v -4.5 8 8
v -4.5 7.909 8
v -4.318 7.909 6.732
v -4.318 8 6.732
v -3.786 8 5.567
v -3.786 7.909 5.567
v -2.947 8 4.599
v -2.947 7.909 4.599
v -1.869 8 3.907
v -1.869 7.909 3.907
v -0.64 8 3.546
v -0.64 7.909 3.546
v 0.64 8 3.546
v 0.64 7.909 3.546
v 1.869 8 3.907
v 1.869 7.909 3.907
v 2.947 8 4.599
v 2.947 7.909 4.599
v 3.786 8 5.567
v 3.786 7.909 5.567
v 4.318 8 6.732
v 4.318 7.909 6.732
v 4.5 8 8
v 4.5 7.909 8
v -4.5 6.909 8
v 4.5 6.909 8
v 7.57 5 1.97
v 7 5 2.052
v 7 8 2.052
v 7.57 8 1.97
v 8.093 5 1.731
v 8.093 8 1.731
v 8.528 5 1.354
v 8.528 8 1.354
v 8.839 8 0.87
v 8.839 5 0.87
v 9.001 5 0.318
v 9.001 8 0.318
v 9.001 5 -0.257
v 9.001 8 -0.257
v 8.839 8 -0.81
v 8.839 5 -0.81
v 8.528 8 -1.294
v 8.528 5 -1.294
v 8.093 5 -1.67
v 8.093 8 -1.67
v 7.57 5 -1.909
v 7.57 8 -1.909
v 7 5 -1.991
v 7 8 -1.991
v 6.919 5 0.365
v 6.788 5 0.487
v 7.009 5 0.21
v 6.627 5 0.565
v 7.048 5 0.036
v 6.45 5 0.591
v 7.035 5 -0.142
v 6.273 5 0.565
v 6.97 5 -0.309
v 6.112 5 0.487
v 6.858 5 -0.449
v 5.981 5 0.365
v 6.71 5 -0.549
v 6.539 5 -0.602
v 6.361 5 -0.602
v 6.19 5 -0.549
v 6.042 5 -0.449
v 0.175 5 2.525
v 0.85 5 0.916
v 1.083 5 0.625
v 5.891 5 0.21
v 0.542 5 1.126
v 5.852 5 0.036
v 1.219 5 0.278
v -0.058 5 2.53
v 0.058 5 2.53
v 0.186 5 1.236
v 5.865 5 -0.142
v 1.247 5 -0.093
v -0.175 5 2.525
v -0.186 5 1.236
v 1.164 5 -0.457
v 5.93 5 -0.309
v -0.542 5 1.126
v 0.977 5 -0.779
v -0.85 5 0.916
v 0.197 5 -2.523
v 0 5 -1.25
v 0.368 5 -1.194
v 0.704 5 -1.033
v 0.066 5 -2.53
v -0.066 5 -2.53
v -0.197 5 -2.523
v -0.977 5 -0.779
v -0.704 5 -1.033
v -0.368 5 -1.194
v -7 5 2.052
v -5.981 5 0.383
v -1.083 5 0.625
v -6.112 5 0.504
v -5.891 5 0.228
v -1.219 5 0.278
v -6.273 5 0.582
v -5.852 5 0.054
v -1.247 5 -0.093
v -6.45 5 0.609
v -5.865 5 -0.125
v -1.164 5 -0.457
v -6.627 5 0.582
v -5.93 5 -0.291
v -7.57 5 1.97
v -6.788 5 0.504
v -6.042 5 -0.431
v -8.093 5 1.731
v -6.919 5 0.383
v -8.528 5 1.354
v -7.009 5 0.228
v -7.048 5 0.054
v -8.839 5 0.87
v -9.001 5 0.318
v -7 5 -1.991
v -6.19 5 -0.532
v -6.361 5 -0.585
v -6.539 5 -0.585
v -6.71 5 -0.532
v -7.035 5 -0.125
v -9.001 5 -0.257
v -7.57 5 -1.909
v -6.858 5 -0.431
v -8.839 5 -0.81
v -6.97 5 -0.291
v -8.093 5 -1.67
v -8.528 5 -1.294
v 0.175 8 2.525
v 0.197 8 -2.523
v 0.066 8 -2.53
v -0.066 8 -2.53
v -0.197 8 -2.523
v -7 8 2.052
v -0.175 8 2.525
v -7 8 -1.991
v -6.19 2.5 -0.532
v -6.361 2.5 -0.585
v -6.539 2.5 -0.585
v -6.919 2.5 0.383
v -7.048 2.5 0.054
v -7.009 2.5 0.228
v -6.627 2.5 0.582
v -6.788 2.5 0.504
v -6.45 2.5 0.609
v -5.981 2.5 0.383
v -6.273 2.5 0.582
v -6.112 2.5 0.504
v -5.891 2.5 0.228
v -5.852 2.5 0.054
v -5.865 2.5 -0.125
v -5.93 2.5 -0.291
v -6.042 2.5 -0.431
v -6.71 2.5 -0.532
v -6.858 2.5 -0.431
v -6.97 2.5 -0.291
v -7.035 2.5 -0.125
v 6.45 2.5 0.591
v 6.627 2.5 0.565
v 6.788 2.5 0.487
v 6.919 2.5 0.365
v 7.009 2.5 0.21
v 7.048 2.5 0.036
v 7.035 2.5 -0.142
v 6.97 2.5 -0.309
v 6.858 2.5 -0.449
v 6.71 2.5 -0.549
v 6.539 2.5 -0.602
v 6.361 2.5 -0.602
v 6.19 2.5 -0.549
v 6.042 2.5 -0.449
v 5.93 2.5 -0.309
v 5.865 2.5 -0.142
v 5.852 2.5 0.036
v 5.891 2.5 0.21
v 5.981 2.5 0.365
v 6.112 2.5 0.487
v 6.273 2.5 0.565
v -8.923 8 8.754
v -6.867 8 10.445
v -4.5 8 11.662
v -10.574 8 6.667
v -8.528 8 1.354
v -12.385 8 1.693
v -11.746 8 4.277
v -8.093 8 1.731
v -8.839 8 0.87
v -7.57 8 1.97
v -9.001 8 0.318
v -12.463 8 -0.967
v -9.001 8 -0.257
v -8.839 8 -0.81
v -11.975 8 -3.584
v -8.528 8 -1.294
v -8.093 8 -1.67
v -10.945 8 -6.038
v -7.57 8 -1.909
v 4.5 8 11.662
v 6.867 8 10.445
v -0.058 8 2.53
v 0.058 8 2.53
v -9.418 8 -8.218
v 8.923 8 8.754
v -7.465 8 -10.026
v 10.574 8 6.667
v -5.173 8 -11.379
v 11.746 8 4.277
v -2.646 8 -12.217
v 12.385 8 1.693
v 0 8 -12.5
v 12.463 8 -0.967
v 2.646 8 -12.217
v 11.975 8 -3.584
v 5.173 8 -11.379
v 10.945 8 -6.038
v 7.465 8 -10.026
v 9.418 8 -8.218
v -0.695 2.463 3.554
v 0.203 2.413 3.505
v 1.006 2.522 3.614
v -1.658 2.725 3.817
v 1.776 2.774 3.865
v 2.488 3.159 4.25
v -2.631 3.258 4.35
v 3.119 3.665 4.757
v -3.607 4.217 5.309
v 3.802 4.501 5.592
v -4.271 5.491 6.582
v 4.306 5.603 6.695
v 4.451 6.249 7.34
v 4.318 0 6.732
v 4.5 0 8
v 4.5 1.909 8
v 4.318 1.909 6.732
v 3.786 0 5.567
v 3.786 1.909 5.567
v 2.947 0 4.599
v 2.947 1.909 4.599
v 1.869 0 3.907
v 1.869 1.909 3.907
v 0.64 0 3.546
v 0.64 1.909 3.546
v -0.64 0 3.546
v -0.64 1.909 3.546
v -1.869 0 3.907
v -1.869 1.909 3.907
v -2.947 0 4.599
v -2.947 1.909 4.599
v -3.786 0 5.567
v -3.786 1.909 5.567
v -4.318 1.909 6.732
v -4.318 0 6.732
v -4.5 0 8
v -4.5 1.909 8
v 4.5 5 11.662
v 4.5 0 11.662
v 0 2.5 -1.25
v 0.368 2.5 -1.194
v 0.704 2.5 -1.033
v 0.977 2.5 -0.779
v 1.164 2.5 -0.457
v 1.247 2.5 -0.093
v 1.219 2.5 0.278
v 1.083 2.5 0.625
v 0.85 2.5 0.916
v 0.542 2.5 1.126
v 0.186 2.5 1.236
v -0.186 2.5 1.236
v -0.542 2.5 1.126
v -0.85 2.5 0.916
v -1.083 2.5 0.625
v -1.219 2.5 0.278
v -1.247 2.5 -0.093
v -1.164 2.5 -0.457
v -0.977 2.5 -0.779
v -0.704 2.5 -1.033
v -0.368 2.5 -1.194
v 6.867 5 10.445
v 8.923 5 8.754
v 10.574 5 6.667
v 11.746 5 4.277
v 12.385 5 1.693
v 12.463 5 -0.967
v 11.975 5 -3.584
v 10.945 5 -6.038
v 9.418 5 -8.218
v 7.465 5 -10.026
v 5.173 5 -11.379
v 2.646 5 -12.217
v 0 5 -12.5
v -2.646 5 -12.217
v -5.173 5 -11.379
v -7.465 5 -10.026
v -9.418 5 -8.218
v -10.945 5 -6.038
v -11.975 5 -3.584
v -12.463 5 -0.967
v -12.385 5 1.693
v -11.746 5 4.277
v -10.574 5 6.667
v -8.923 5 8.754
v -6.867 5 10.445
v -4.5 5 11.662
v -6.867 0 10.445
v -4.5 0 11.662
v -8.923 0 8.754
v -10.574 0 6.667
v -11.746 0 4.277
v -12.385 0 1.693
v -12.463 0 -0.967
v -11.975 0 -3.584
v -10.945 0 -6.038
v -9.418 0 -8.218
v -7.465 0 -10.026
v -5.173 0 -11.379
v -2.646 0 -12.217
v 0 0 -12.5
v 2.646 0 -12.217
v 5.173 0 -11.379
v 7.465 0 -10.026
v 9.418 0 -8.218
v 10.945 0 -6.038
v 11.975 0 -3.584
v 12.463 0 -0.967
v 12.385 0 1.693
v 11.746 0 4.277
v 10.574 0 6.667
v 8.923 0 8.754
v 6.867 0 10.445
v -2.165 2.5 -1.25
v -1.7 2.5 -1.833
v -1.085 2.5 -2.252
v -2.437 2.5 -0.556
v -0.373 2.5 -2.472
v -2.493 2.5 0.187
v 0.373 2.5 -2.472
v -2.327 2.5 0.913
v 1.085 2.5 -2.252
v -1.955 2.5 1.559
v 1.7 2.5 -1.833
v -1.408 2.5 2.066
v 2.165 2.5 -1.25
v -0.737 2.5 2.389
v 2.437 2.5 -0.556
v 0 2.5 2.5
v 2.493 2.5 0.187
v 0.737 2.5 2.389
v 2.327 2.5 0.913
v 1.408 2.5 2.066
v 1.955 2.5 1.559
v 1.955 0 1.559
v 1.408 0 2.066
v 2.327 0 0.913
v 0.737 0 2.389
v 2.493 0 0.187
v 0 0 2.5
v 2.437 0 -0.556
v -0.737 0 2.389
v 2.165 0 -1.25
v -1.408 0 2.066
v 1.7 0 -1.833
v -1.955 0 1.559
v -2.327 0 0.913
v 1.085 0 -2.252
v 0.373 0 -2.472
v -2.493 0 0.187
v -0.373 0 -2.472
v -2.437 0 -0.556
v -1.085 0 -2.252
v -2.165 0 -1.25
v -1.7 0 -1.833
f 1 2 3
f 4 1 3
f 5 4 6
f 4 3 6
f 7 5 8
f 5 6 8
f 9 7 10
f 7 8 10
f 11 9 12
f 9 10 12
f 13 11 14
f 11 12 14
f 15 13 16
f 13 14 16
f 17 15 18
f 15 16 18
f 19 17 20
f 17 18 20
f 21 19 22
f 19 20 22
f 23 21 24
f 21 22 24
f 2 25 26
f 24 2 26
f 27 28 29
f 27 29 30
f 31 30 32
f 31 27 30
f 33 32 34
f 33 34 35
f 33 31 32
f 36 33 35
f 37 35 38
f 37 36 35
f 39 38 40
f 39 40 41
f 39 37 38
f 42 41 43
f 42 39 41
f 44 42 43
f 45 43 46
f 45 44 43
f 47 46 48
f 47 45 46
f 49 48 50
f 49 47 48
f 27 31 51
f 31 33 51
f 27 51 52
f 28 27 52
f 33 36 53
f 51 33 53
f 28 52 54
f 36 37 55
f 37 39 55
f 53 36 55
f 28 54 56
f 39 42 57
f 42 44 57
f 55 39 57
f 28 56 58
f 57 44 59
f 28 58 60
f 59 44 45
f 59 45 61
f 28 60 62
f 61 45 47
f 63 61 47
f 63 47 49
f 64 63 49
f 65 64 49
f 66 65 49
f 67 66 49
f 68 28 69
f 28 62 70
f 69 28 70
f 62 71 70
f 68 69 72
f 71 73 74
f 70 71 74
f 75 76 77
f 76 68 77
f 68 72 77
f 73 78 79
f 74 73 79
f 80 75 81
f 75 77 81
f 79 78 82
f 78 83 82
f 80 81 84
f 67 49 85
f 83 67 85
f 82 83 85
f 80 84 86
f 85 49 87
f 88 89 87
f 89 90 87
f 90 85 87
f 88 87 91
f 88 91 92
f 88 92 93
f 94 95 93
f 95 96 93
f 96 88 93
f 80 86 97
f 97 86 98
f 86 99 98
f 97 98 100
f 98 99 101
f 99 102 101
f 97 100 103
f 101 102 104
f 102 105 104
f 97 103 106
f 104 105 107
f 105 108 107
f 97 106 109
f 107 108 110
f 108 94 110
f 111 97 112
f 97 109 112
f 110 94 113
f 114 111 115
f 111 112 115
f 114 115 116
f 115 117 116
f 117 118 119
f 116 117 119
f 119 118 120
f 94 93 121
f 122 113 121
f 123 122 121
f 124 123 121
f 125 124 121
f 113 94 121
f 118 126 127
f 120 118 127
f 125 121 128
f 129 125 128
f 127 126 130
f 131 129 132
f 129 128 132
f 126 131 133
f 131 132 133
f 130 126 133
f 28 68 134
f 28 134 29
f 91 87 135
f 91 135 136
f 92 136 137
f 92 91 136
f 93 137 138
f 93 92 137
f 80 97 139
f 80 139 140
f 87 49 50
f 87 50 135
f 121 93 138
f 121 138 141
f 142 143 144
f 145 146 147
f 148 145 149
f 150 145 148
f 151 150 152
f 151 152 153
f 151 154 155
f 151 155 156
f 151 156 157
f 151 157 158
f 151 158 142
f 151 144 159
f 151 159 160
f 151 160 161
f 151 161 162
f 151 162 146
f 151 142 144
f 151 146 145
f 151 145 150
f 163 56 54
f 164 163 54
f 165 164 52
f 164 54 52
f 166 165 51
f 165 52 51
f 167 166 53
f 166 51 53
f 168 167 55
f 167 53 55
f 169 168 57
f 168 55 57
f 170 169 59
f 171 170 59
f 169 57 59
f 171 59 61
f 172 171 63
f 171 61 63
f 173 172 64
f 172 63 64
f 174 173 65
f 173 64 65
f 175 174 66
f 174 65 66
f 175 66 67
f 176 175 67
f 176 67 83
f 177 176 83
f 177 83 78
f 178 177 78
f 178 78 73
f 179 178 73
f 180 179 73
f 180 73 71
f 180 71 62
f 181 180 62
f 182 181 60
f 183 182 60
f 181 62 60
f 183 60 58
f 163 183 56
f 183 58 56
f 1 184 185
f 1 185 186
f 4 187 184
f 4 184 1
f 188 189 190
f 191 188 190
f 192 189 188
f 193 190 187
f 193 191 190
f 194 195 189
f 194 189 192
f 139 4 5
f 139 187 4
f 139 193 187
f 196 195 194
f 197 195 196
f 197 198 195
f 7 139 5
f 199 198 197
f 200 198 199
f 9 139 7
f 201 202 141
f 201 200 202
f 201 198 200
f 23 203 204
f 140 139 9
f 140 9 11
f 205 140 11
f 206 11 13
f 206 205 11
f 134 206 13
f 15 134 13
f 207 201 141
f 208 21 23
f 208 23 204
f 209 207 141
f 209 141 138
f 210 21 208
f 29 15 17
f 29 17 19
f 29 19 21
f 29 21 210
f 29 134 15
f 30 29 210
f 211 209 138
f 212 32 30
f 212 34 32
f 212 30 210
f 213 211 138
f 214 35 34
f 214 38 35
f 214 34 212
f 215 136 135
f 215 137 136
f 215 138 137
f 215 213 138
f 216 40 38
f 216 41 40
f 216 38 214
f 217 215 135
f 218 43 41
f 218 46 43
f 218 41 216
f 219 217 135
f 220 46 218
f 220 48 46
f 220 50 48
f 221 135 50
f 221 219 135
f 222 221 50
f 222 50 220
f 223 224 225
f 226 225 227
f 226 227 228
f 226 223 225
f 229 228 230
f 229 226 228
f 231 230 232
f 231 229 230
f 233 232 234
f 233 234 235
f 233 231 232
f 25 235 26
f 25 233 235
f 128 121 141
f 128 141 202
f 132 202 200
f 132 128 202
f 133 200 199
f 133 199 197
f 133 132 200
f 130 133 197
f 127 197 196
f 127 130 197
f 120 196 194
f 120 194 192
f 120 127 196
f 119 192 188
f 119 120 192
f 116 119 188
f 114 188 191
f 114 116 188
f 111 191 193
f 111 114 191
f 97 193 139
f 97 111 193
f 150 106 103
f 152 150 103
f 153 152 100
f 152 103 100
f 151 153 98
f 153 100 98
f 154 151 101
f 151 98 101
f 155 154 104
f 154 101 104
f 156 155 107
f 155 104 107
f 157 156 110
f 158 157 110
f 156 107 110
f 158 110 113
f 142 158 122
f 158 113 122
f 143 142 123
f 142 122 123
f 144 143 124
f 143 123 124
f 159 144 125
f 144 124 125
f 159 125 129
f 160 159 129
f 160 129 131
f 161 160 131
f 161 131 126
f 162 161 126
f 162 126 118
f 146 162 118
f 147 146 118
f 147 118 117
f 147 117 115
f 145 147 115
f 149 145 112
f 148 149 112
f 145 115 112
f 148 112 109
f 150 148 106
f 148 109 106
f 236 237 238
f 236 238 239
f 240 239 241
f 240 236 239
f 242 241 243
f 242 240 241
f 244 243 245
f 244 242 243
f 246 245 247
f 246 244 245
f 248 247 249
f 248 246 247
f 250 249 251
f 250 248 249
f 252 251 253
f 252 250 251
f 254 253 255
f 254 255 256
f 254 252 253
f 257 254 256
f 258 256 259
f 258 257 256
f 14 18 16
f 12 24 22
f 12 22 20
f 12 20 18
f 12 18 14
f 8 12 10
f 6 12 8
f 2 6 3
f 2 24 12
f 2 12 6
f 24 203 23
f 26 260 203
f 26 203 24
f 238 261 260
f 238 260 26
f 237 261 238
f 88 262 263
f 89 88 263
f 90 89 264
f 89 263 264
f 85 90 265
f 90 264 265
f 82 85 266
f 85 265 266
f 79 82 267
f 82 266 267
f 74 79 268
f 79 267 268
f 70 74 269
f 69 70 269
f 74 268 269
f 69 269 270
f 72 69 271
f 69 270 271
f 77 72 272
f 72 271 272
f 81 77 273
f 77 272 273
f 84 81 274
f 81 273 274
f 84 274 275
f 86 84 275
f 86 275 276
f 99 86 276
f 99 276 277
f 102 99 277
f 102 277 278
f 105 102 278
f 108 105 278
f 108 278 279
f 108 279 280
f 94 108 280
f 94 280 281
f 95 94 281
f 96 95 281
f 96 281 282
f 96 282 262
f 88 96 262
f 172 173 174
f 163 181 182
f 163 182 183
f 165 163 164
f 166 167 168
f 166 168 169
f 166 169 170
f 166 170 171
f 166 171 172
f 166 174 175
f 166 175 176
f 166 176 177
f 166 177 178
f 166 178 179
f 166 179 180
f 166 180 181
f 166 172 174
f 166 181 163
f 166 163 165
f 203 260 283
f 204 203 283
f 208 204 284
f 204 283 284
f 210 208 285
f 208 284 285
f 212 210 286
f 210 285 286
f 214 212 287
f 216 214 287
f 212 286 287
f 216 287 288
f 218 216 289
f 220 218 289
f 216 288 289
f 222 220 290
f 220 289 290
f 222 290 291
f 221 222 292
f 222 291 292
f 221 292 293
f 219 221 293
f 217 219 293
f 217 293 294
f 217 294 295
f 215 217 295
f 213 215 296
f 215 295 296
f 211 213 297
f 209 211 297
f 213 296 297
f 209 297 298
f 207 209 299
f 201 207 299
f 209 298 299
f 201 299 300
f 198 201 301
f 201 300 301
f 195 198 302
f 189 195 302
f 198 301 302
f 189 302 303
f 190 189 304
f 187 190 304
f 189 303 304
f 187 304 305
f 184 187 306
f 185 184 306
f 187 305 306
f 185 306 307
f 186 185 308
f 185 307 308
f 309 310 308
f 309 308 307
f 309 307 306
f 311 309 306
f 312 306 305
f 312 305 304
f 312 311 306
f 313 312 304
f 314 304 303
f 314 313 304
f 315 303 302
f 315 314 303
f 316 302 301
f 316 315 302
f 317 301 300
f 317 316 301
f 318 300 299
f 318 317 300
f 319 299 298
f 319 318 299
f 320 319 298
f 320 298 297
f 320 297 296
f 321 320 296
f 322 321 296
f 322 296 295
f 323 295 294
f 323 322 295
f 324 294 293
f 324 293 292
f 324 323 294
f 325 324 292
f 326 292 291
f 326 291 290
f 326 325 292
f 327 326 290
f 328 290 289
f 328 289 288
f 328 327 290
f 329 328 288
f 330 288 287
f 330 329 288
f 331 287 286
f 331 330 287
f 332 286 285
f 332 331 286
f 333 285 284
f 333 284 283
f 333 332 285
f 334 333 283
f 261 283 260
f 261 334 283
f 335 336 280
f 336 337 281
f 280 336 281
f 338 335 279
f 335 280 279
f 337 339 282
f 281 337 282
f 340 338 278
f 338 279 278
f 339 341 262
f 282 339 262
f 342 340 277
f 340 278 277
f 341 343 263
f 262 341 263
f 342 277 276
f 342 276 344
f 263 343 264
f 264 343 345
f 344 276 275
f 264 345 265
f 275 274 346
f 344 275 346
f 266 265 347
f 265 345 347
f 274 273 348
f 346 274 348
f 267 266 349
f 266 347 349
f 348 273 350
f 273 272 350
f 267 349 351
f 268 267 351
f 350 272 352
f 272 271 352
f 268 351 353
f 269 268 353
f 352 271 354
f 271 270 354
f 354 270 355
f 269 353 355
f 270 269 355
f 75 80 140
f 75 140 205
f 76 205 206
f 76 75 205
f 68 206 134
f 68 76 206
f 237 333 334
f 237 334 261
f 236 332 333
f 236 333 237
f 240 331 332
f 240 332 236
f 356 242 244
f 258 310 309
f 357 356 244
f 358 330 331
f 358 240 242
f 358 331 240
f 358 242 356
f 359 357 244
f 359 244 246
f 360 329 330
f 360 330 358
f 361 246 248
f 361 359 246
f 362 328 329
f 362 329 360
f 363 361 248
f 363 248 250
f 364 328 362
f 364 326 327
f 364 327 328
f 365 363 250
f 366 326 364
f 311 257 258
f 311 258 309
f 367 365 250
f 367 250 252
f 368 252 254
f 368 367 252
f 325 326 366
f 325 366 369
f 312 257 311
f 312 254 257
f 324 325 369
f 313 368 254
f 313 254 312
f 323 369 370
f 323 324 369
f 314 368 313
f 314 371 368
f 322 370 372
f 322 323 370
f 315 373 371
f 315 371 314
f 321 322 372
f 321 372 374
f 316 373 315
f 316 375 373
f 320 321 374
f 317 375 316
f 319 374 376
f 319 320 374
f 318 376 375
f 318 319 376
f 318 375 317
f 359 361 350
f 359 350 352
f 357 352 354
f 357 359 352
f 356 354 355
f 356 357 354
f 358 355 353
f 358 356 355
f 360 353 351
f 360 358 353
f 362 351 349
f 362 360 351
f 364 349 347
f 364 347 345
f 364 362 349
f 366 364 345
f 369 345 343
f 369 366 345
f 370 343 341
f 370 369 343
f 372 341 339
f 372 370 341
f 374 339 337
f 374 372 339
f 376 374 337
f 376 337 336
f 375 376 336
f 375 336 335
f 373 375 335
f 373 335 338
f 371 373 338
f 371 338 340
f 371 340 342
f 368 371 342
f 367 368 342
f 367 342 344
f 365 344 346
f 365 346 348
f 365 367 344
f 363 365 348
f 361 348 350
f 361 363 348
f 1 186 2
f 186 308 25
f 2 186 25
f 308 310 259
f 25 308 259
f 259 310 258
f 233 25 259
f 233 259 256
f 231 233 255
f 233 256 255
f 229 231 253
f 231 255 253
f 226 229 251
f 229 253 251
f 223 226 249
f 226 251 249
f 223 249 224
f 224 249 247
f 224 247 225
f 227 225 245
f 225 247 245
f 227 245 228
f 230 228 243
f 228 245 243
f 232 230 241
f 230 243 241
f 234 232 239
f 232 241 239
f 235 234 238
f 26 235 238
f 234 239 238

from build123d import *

# Parameters (mm, degrees)
Y_KSEKLIK_EKSTR_ZYON1_DEPTH = 5
IZIM2_R                     = 2.5
KES_EKSTR_ZYON3_DEPTH       = 2.5
IZIM3_R                     = 1.25
KES_EKSTR_ZYON4_DEPTH       = 18.853571071
IZIM5_R                     = 0.6
KES_EKSTR_ZYON5_DEPTH       = 2.5
Y_KSEKLIK_EKSTR_ZYON3_DEPTH = 3
BOSS_EXTRUDE1_START         = 6
BOSS_EXTRUDE1_DEPTH         = 6
CHAMFER1_SIZE               = 5


with BuildPart() as part:
    # Çizim1 → Yükseklik-Ekstrüzyon1 (new body)
    with BuildSketch(Plane(origin=(0, 0, 0), x_dir=(1, 0, 0), z_dir=(0, 1, 0))):
        with BuildLine():
            Line((-4.5, -8), (-4.5, -11.66190379))
            ThreePointArc((-4.5, -11.66190379), (0, 12.5), (4.5, -11.66190379))
            Line((4.5, -11.66190379), (4.5, -8))
            ThreePointArc((4.5, -8), (0, -3.5), (-4.5, -8))
        make_face()
    extrude(amount=Y_KSEKLIK_EKSTR_ZYON1_DEPTH)

    # Çizim2 → Kes-Ekstrüzyon3 (cut)
    with BuildSketch(Plane(origin=(0, 0, 0), x_dir=(1, 0, 0), z_dir=(0, 1, 0))):
        with Locations(Location((0, 0, 0), (0, 0, 270))):
            Circle(IZIM2_R)
    extrude(amount=KES_EKSTR_ZYON3_DEPTH, mode=Mode.SUBTRACT)

    # Çizim3 → Kes-Ekstrüzyon4 (cut, through all)
    with BuildSketch(Plane.XZ.offset(-2.5)):
        with Locations(Location((0, 0, 0), (0, 0, 270))):
            Circle(IZIM3_R)
    extrude(amount=-KES_EKSTR_ZYON4_DEPTH, mode=Mode.SUBTRACT)

    # Çizim5 → Kes-Ekstrüzyon5 (cut)
    with BuildSketch(Plane(origin=(0, 5, 0), x_dir=(1, 0, 0), z_dir=(0, 1, 0))):
        with Locations(Location((-6.449994102, -0.008722575, 0), (0, 0, 270))):
            Circle(IZIM5_R)
        with Locations(Location((6.449994102, 0.008722575, 0), (0, 0, 270))):
            Circle(IZIM5_R)
    extrude(amount=-KES_EKSTR_ZYON5_DEPTH, mode=Mode.SUBTRACT)

    # Çizim6 → Yükseklik-Ekstrüzyon3 (add)
    with BuildSketch(Plane(origin=(0, 5, 0), x_dir=(1, 0, 0), z_dir=(0, 1, 0))):
        with BuildLine():
            Line((-4.5, -11.66190379), (-4.5, -8))
            ThreePointArc((-4.5, -8), (0, -3.5), (4.5, -8))
            Line((4.5, -8), (4.5, -11.66190379))
            ThreePointArc((4.5, -11.66190379), (0, 12.5), (-4.5, -11.66190379))
        make_face()
        with BuildLine():
            Line((7, 1.991277425), (0.197348928, 2.523314182))
            ThreePointArc((0.197348928, 2.523314182), (0, 2.531019767), (-0.197348928, 2.523314182))
            Line((-0.197348928, 2.523314182), (-7, 1.991277425))
            ThreePointArc((-7, 1.991277425), (-9.021556758, -0.030279333), (-7, -2.051836091))
            Line((-7, -2.051836091), (-0.175036702, -2.524960042))
            ThreePointArc((-0.175036702, -2.524960042), (0, -2.531019767), (0.175036702, -2.524960042))
            Line((0.175036702, -2.524960042), (7, -2.051836091))
            ThreePointArc((7, -2.051836091), (9.021556758, -0.030279333), (7, 1.991277425))
        make_face(mode=Mode.SUBTRACT)
    extrude(amount=Y_KSEKLIK_EKSTR_ZYON3_DEPTH)

    # Sketch1 → Boss-Extrude1 (add)
    with BuildSketch(Plane.XZ.offset(-7.908623835).offset(BOSS_EXTRUDE1_START)):
        with BuildLine():
            Line((-4.5, 8), (4.5, 8))
            ThreePointArc((4.5, 8), (0, 3.5), (-4.5, 8))
        make_face()
    extrude(amount=-BOSS_EXTRUDE1_DEPTH)

    # Chamfer1
    # the kernel refuses this chamfer: 5 mm, written as the material it takes off along each edge
    with BuildSketch(Plane(origin=(-17.35841494, 1.908623835, 8), x_dir=(0, -0.027495876610586226, -0.9996219169112968), z_dir=(1, 0, 0))) as chamfer1_piece_1_section:
        Polygon((CHAMFER1_SIZE * 0.999621916911, CHAMFER1_SIZE * 0.0274958766106), (-CHAMFER1_SIZE * 0.0274958766106, CHAMFER1_SIZE * 0.999621916911), (0, 0), align=None)
    chamfer1_piece_1 = extrude(amount=34.71682988, mode=Mode.PRIVATE)
    chamfer1_piece_1 = chamfer1_piece_1 & Plane(origin=(0, 3.682638029, 8), x_dir=(1, 0, 0), z_dir=(0, -1, 0)) * Cylinder(4.5, 90, mode=Mode.PRIVATE)
    add(chamfer1_piece_1, mode=Mode.SUBTRACT)


solid = part.part
